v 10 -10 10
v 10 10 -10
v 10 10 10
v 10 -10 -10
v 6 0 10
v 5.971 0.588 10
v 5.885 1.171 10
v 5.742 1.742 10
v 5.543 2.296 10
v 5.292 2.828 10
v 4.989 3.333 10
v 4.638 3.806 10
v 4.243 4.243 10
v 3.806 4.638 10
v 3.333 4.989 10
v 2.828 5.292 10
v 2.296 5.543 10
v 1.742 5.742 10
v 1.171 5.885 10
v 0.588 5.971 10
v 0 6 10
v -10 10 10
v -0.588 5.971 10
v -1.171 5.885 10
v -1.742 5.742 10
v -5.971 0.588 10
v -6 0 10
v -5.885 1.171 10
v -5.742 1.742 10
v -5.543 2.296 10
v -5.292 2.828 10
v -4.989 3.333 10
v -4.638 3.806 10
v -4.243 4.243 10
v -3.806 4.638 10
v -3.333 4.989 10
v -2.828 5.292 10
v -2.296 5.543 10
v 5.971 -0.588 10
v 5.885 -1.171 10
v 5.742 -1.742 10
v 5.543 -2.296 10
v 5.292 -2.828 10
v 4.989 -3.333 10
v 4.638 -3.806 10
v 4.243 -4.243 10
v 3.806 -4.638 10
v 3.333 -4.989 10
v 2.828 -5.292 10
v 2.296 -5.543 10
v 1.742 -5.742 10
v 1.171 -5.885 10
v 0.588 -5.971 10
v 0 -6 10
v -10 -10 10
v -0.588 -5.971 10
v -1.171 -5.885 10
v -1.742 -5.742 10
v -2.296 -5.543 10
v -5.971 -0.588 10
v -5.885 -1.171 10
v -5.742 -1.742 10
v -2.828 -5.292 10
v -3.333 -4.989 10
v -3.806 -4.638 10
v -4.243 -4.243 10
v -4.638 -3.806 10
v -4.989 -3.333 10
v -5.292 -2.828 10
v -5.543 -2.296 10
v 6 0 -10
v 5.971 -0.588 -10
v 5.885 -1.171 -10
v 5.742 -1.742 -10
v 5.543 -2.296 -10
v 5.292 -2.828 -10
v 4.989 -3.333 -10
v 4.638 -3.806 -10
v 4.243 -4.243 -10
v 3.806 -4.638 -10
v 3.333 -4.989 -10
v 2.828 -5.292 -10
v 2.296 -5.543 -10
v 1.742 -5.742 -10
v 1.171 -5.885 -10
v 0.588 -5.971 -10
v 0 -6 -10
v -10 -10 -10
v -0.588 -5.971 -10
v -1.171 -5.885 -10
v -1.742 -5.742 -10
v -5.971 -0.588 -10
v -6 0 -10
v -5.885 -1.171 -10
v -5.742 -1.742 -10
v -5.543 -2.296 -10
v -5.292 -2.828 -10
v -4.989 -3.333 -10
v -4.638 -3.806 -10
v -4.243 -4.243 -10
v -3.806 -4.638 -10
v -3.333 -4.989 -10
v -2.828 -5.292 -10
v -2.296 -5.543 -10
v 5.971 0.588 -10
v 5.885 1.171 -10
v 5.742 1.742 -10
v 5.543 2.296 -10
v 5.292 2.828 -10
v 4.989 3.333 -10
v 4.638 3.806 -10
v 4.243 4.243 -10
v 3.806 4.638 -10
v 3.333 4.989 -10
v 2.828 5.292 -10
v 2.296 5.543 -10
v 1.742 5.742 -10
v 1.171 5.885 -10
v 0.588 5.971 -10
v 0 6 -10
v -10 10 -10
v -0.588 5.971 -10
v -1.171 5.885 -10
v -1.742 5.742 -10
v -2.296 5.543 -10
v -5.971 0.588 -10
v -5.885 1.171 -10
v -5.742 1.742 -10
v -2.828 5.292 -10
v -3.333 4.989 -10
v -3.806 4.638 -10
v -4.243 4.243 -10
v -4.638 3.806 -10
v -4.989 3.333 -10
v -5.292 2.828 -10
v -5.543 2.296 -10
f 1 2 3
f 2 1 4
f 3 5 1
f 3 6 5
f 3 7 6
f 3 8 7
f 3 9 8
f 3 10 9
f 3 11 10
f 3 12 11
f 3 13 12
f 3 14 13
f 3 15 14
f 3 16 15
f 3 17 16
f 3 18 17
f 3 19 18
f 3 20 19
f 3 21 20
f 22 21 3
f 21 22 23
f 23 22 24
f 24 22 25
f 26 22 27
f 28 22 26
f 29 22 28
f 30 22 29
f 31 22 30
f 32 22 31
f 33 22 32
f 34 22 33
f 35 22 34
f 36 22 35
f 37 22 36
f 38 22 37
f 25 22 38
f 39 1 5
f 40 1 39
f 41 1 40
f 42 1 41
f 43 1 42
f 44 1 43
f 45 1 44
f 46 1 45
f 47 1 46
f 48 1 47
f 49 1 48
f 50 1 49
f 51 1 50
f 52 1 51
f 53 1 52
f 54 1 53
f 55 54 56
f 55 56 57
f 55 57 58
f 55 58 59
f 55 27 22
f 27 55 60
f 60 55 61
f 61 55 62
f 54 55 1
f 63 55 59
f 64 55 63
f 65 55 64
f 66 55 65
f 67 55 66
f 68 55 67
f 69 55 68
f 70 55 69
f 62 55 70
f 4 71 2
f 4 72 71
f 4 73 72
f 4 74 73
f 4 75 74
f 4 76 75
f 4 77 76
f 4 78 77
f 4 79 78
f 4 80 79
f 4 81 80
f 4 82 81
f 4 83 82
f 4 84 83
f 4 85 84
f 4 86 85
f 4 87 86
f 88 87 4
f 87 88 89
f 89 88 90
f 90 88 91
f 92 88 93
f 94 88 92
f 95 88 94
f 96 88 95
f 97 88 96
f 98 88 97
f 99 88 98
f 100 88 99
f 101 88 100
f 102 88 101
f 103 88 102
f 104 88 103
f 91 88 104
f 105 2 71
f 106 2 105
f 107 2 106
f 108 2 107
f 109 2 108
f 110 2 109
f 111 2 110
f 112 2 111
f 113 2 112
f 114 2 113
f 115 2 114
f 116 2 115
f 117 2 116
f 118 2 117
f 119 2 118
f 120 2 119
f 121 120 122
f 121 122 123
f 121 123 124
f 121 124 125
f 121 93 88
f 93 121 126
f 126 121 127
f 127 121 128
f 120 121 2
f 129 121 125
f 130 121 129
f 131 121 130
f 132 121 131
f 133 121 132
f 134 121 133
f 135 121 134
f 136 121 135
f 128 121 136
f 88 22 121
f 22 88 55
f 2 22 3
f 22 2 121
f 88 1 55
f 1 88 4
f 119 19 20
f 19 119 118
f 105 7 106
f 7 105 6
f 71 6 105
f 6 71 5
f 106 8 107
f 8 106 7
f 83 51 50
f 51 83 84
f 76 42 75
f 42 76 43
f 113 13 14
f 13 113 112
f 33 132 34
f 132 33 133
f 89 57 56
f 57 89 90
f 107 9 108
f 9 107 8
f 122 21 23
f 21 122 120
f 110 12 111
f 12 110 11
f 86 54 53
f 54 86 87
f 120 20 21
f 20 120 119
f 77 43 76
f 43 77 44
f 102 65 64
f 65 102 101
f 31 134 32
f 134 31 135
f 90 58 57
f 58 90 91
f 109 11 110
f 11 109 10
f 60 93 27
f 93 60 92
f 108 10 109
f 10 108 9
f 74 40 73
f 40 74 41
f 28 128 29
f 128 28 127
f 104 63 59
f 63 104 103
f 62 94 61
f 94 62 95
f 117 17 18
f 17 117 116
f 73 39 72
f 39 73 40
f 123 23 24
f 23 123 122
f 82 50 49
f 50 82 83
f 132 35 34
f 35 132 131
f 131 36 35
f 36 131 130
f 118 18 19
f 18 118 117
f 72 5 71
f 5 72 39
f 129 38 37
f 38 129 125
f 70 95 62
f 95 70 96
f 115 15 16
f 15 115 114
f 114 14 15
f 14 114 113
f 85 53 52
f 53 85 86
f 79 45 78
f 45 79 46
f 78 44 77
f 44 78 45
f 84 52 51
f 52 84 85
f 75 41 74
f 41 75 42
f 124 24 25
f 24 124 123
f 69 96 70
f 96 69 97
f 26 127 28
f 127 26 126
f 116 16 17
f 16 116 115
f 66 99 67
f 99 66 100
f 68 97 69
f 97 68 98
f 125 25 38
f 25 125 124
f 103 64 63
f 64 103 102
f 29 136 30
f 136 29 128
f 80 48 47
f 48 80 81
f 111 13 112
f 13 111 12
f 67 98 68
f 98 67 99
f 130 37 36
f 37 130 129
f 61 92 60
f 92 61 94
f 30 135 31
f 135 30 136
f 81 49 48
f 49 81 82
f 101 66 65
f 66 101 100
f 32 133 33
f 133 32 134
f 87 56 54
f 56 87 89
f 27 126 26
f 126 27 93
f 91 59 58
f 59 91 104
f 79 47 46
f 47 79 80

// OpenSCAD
difference() { cube(20, center=true); cylinder(h=30, r=6, center=true, $fn=64); }
